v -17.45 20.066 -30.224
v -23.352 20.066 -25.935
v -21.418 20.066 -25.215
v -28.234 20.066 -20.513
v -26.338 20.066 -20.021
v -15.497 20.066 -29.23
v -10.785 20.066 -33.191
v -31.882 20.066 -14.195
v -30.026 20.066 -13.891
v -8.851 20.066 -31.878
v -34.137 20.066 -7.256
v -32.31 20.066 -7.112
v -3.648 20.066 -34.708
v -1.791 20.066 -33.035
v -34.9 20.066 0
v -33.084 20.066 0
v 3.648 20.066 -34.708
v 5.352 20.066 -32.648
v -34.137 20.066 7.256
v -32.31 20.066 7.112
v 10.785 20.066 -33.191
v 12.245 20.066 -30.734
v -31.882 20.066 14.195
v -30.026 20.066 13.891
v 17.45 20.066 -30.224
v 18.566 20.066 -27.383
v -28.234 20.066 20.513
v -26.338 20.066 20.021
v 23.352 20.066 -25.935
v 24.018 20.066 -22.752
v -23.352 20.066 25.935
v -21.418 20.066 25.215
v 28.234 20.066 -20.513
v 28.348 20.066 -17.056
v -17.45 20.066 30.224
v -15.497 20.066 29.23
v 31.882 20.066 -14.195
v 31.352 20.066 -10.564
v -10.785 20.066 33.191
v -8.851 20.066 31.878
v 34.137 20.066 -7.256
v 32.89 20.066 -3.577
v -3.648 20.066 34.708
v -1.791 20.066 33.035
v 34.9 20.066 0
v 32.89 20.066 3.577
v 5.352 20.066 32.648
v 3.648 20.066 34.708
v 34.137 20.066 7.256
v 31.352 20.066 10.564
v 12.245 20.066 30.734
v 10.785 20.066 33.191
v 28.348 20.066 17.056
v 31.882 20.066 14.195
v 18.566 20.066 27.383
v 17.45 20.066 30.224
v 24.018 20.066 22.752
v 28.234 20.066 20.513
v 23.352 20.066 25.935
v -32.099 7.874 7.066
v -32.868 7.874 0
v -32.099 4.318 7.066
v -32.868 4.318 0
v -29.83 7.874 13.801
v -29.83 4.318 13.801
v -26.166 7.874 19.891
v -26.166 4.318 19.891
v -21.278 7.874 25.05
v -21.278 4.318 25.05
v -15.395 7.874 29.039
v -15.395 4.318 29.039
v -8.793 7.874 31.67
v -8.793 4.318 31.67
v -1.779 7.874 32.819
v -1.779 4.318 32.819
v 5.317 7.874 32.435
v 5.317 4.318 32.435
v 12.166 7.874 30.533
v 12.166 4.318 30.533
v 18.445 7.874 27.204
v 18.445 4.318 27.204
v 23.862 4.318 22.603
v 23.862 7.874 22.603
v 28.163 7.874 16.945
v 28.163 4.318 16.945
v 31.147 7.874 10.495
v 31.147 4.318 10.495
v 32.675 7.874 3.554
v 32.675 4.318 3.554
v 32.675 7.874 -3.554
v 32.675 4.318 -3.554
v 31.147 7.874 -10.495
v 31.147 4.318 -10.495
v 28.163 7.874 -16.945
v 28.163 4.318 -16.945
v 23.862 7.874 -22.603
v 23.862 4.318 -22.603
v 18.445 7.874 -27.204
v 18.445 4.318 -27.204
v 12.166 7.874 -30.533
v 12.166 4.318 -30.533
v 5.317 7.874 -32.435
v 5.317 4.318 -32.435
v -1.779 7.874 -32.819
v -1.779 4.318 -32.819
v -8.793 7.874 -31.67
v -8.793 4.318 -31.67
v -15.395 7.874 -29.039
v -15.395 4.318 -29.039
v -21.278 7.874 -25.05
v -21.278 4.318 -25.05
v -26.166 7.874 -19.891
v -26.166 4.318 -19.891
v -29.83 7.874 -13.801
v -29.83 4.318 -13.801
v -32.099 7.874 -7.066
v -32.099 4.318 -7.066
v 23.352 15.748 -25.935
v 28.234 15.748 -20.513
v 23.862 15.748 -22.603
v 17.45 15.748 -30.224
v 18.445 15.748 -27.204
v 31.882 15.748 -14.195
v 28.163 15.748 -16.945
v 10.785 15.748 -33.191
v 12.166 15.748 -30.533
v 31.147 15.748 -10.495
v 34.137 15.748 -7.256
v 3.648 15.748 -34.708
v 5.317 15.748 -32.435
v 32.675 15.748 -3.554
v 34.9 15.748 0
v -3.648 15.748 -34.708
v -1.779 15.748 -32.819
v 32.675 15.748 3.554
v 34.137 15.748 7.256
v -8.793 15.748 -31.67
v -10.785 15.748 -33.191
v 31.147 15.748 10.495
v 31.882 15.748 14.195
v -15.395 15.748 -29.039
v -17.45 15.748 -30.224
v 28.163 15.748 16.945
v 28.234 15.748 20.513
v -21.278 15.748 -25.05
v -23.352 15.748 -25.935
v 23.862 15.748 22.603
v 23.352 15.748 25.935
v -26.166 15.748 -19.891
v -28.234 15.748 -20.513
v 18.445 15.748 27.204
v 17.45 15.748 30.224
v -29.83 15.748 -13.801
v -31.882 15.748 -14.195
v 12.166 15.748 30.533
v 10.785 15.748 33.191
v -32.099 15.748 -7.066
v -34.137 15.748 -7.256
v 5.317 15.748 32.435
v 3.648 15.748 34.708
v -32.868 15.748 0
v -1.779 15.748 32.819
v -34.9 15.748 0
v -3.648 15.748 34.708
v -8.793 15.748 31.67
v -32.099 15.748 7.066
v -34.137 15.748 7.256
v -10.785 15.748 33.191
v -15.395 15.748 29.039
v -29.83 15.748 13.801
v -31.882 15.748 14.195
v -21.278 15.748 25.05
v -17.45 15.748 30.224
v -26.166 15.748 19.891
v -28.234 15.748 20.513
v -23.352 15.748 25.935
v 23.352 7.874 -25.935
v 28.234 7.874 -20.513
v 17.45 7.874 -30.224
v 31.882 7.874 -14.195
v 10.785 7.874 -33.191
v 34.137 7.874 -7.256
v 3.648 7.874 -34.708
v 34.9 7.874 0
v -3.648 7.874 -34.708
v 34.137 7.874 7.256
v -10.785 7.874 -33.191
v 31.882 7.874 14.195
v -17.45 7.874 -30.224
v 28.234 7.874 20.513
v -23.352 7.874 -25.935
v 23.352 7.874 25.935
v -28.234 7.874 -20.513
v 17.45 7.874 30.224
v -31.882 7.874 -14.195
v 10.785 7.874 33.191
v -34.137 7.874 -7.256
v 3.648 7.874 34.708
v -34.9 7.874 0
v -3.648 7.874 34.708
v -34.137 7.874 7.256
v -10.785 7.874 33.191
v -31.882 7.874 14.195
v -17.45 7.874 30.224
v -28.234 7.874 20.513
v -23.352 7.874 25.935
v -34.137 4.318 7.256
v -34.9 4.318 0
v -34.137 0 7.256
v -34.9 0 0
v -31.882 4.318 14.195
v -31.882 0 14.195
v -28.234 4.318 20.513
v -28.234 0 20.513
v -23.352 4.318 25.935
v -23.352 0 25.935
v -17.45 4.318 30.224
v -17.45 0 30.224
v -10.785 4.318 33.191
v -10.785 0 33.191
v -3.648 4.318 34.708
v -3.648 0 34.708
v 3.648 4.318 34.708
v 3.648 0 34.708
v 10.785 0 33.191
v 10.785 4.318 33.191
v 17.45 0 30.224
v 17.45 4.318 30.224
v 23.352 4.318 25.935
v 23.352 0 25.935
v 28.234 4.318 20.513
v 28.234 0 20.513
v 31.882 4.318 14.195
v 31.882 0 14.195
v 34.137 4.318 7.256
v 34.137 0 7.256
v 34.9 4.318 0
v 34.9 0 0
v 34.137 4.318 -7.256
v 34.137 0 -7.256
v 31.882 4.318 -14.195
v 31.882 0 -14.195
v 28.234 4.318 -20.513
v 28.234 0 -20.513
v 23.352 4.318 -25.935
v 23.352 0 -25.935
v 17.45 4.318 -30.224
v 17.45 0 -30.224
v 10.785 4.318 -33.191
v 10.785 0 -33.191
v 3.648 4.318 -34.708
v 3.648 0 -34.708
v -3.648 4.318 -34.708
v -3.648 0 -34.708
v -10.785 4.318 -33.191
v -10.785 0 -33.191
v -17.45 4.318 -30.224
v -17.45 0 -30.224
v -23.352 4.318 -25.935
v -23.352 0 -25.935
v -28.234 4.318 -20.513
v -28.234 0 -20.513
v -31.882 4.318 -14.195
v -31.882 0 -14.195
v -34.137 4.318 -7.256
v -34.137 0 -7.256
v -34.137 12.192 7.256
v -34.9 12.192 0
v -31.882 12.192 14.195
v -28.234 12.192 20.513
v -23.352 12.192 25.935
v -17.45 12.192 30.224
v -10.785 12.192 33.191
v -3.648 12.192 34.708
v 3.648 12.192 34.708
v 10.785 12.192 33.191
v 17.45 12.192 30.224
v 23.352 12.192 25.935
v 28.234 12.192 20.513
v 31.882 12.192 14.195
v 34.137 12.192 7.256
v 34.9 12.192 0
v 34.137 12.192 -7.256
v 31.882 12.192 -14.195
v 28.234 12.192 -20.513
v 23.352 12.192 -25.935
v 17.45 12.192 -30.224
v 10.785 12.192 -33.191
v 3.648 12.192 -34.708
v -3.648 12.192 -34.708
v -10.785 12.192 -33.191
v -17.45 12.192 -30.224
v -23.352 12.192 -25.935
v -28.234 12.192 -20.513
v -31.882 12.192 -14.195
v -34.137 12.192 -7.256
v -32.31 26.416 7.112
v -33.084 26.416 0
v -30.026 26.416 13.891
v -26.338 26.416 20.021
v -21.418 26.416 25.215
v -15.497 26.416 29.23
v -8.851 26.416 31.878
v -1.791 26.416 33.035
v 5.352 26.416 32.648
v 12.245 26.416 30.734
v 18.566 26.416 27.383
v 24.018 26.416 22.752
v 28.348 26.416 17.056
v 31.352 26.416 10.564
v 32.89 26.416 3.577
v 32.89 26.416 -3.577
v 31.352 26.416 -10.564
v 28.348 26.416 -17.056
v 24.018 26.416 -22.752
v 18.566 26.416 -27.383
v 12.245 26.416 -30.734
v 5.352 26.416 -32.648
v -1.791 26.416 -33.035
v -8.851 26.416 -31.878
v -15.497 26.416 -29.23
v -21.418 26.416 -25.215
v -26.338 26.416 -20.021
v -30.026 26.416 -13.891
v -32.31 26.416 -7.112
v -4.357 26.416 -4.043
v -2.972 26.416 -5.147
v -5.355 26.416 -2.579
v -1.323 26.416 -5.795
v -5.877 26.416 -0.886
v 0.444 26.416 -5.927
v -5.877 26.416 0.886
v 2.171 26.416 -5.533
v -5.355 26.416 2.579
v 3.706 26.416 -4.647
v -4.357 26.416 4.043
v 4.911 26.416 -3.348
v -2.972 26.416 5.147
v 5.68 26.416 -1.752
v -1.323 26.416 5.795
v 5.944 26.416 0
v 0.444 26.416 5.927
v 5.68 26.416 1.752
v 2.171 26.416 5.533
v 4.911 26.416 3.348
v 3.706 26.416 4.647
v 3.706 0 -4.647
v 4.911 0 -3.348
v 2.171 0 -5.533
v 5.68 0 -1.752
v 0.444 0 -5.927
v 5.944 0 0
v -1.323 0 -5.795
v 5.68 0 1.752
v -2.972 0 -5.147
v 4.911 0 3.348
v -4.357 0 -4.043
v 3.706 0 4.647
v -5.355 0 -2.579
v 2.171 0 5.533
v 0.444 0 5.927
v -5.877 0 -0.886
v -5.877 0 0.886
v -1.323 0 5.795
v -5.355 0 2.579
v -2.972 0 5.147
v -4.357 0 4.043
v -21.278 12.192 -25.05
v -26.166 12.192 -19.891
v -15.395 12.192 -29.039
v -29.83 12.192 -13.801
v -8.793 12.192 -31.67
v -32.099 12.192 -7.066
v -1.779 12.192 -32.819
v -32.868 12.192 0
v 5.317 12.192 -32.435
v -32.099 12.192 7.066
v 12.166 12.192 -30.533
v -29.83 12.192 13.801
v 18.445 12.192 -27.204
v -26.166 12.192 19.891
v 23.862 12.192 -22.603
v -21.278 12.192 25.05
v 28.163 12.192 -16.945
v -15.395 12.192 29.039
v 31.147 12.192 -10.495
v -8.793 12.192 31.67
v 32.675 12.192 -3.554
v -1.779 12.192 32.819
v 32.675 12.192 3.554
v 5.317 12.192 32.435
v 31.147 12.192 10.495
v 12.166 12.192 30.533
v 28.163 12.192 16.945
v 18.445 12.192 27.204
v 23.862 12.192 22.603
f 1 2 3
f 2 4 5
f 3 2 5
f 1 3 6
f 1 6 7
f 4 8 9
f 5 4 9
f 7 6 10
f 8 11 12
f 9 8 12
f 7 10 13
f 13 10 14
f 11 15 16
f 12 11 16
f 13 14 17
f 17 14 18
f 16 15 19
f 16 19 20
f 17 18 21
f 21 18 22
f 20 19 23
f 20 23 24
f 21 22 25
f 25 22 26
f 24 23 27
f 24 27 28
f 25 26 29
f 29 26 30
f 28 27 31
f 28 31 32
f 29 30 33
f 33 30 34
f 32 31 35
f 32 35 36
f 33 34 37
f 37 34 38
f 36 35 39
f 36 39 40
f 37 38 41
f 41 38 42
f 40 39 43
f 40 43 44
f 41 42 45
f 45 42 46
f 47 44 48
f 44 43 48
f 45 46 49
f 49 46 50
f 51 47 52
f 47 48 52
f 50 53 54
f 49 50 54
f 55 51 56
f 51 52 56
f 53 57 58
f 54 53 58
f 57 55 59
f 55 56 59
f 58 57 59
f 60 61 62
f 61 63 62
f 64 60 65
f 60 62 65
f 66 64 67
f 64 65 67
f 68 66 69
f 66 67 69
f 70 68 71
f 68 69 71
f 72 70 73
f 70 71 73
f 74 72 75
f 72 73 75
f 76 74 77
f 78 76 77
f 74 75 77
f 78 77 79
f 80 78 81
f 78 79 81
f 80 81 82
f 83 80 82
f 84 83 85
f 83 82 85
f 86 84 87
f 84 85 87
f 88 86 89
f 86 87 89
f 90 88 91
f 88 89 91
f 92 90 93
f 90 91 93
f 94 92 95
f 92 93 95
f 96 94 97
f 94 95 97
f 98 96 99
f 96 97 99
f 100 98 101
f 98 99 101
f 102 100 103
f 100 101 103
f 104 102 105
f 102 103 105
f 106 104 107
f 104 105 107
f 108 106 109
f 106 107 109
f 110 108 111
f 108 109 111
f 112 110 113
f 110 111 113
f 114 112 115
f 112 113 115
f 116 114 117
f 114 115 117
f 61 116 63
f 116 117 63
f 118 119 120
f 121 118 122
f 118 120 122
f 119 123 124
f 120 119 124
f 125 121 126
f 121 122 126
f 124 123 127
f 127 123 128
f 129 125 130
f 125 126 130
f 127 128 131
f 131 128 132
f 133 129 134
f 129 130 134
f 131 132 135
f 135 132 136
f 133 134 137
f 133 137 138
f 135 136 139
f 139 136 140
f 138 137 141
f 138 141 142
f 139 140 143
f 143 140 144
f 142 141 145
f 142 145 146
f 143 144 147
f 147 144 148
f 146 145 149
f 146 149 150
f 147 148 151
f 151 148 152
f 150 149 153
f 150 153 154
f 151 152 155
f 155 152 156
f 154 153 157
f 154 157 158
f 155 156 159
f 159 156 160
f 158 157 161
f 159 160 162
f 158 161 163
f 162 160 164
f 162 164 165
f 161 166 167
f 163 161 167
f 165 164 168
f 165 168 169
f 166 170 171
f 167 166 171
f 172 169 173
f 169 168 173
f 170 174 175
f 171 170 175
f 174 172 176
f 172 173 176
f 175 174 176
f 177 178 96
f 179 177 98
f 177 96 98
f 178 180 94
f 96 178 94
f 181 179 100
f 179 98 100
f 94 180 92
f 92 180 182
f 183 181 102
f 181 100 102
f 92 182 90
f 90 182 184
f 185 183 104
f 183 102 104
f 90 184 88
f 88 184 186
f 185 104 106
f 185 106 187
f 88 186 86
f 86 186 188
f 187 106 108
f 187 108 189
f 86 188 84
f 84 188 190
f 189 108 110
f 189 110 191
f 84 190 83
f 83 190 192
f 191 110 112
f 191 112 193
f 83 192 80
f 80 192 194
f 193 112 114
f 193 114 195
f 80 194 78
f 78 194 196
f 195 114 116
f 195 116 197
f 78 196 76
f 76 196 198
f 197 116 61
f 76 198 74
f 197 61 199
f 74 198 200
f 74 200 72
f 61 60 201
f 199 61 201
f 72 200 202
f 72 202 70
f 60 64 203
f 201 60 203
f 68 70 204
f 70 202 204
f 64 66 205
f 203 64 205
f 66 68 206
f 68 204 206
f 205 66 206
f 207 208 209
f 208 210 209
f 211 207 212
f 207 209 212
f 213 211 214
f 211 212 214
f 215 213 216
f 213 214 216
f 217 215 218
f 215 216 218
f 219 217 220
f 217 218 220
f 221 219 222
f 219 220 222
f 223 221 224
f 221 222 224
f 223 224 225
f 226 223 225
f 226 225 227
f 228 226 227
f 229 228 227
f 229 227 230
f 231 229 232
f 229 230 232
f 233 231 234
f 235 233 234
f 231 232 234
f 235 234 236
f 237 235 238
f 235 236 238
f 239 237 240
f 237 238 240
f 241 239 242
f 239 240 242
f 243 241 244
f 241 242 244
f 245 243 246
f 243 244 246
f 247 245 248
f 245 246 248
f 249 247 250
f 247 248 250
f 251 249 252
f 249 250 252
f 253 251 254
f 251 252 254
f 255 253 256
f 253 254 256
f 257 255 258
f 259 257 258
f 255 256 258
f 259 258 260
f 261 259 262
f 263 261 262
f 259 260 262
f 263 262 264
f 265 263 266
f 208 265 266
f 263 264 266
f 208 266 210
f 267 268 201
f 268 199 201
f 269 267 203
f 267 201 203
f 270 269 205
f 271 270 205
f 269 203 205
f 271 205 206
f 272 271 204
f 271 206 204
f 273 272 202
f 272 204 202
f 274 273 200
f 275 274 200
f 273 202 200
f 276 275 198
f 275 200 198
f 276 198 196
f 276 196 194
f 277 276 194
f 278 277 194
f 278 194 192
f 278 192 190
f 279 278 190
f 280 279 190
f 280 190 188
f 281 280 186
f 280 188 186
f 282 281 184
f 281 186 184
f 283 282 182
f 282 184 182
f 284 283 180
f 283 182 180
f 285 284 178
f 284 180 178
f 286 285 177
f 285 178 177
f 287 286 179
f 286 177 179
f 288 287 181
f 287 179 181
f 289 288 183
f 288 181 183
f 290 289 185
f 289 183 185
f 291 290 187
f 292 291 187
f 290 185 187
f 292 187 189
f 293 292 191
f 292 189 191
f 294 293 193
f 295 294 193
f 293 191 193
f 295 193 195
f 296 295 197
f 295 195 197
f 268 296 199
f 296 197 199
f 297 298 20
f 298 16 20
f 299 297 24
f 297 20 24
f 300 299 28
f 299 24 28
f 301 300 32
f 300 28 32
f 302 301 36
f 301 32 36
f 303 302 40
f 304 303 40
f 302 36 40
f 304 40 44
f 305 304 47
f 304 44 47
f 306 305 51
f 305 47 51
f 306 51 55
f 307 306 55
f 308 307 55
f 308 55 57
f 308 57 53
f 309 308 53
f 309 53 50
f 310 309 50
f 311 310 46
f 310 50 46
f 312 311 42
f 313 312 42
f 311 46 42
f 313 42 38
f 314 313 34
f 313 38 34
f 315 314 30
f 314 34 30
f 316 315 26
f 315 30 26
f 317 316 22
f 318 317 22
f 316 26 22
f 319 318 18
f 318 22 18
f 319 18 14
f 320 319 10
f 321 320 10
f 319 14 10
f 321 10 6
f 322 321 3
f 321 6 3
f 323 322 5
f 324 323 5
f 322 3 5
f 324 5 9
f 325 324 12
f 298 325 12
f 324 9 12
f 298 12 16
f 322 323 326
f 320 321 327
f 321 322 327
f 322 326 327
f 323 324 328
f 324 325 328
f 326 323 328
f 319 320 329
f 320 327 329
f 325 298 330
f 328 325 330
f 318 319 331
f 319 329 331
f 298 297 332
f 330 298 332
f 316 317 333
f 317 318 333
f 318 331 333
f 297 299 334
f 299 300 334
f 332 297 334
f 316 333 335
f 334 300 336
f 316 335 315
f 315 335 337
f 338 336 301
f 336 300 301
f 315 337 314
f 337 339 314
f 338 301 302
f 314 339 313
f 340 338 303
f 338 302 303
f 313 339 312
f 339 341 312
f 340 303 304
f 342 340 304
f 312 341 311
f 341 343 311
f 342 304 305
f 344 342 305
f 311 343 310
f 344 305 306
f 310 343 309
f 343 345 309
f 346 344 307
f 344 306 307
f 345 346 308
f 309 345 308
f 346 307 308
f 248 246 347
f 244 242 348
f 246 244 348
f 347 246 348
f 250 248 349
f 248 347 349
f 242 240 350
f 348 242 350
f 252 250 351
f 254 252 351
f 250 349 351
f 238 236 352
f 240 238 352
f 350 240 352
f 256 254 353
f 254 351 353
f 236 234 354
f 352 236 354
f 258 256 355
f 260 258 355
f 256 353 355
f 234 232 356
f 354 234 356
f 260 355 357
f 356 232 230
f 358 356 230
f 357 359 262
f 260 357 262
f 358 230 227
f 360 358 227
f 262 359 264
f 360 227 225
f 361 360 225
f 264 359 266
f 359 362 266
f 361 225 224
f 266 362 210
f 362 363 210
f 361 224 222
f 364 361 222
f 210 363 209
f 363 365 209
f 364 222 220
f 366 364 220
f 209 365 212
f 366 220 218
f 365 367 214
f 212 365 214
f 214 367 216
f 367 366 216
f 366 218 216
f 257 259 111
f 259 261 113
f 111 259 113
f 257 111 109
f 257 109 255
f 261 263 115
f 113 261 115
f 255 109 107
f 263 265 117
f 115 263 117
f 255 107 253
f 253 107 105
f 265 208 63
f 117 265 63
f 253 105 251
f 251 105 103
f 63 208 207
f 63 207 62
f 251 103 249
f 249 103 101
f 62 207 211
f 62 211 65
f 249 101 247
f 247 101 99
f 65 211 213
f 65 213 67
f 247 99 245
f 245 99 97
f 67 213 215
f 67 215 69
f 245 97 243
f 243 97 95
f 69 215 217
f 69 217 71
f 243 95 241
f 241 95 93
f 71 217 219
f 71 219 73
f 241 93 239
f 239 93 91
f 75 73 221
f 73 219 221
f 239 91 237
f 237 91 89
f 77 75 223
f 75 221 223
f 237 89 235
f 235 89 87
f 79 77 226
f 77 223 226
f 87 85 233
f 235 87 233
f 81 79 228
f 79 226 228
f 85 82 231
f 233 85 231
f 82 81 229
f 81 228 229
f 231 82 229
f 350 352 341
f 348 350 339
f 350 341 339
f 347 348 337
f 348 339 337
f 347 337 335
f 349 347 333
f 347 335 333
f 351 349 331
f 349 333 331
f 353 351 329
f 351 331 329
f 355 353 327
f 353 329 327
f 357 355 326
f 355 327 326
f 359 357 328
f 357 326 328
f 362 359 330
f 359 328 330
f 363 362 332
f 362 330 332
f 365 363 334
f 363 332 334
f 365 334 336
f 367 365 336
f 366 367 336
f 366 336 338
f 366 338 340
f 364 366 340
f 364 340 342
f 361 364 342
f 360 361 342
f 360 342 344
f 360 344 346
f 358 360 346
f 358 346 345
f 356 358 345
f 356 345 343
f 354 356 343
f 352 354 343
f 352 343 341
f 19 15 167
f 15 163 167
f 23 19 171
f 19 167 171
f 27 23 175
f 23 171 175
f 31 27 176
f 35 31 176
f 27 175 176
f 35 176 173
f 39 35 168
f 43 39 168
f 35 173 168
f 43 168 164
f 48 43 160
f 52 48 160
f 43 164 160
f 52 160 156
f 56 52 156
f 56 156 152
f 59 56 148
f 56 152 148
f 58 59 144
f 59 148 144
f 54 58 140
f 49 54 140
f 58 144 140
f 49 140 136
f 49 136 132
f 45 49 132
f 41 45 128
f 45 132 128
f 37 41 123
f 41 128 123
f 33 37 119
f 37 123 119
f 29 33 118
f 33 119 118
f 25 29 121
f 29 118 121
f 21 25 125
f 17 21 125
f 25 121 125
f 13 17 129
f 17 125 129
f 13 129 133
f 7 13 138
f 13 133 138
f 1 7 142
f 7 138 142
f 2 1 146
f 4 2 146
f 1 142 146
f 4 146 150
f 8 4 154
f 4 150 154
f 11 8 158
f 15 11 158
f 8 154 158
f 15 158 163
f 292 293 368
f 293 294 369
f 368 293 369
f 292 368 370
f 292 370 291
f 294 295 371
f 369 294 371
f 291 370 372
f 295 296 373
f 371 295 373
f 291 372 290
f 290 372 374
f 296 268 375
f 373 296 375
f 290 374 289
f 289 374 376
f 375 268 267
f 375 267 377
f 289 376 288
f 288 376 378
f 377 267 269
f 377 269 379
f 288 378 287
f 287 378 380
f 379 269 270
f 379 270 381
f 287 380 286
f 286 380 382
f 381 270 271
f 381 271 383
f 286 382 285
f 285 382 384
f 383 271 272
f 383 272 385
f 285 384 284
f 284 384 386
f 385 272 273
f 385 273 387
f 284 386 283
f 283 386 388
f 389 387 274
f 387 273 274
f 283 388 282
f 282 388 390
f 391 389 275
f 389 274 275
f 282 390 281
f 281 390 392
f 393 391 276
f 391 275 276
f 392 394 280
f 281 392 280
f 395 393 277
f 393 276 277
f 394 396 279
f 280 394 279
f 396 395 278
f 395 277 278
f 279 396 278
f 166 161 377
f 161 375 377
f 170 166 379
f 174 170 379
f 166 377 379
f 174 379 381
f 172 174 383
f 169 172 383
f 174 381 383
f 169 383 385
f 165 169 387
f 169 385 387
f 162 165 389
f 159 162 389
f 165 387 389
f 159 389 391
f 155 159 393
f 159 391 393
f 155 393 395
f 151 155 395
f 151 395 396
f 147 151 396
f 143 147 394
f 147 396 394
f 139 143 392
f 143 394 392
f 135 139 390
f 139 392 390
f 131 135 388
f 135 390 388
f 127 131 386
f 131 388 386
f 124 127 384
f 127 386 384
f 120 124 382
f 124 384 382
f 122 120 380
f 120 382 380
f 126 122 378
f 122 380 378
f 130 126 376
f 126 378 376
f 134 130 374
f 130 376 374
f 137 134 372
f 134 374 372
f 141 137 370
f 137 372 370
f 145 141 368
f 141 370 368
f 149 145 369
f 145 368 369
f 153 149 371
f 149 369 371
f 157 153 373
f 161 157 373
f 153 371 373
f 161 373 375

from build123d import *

# Parameters (mm, degrees)
F_1_4_18_NPSM_TAPPED_HOLE1_D = 11.8872


with BuildPart() as part:
    # Sketch8 → Revolve1 (revolve)
    with BuildSketch(Plane.XY):
        Polygon((0, 0), (0, 26.416), (-33.0835, 26.416), (-33.0835, 20.066), (-34.8996, 20.066), (-34.8996, 15.748), (-32.8676, 15.748), (-32.8676, 12.192), (-34.8996, 12.192), (-34.8996, 7.874), (-32.8676, 7.874), (-32.8676, 4.318), (-34.8996, 4.318), (-34.8996, 0), align=None)
    revolve(axis=Axis((0, 0, 0), (0, 1, 0)))

    # 1/4-18 NPSM Tapped Hole1 (through all)
    with Locations(Plane(origin=(0, 0, 0), x_dir=(-1, 0, 0), z_dir=(0, -1, 0))):
        with Locations((0, 0)):
            Hole(F_1_4_18_NPSM_TAPPED_HOLE1_D / 2)


solid = part.part
